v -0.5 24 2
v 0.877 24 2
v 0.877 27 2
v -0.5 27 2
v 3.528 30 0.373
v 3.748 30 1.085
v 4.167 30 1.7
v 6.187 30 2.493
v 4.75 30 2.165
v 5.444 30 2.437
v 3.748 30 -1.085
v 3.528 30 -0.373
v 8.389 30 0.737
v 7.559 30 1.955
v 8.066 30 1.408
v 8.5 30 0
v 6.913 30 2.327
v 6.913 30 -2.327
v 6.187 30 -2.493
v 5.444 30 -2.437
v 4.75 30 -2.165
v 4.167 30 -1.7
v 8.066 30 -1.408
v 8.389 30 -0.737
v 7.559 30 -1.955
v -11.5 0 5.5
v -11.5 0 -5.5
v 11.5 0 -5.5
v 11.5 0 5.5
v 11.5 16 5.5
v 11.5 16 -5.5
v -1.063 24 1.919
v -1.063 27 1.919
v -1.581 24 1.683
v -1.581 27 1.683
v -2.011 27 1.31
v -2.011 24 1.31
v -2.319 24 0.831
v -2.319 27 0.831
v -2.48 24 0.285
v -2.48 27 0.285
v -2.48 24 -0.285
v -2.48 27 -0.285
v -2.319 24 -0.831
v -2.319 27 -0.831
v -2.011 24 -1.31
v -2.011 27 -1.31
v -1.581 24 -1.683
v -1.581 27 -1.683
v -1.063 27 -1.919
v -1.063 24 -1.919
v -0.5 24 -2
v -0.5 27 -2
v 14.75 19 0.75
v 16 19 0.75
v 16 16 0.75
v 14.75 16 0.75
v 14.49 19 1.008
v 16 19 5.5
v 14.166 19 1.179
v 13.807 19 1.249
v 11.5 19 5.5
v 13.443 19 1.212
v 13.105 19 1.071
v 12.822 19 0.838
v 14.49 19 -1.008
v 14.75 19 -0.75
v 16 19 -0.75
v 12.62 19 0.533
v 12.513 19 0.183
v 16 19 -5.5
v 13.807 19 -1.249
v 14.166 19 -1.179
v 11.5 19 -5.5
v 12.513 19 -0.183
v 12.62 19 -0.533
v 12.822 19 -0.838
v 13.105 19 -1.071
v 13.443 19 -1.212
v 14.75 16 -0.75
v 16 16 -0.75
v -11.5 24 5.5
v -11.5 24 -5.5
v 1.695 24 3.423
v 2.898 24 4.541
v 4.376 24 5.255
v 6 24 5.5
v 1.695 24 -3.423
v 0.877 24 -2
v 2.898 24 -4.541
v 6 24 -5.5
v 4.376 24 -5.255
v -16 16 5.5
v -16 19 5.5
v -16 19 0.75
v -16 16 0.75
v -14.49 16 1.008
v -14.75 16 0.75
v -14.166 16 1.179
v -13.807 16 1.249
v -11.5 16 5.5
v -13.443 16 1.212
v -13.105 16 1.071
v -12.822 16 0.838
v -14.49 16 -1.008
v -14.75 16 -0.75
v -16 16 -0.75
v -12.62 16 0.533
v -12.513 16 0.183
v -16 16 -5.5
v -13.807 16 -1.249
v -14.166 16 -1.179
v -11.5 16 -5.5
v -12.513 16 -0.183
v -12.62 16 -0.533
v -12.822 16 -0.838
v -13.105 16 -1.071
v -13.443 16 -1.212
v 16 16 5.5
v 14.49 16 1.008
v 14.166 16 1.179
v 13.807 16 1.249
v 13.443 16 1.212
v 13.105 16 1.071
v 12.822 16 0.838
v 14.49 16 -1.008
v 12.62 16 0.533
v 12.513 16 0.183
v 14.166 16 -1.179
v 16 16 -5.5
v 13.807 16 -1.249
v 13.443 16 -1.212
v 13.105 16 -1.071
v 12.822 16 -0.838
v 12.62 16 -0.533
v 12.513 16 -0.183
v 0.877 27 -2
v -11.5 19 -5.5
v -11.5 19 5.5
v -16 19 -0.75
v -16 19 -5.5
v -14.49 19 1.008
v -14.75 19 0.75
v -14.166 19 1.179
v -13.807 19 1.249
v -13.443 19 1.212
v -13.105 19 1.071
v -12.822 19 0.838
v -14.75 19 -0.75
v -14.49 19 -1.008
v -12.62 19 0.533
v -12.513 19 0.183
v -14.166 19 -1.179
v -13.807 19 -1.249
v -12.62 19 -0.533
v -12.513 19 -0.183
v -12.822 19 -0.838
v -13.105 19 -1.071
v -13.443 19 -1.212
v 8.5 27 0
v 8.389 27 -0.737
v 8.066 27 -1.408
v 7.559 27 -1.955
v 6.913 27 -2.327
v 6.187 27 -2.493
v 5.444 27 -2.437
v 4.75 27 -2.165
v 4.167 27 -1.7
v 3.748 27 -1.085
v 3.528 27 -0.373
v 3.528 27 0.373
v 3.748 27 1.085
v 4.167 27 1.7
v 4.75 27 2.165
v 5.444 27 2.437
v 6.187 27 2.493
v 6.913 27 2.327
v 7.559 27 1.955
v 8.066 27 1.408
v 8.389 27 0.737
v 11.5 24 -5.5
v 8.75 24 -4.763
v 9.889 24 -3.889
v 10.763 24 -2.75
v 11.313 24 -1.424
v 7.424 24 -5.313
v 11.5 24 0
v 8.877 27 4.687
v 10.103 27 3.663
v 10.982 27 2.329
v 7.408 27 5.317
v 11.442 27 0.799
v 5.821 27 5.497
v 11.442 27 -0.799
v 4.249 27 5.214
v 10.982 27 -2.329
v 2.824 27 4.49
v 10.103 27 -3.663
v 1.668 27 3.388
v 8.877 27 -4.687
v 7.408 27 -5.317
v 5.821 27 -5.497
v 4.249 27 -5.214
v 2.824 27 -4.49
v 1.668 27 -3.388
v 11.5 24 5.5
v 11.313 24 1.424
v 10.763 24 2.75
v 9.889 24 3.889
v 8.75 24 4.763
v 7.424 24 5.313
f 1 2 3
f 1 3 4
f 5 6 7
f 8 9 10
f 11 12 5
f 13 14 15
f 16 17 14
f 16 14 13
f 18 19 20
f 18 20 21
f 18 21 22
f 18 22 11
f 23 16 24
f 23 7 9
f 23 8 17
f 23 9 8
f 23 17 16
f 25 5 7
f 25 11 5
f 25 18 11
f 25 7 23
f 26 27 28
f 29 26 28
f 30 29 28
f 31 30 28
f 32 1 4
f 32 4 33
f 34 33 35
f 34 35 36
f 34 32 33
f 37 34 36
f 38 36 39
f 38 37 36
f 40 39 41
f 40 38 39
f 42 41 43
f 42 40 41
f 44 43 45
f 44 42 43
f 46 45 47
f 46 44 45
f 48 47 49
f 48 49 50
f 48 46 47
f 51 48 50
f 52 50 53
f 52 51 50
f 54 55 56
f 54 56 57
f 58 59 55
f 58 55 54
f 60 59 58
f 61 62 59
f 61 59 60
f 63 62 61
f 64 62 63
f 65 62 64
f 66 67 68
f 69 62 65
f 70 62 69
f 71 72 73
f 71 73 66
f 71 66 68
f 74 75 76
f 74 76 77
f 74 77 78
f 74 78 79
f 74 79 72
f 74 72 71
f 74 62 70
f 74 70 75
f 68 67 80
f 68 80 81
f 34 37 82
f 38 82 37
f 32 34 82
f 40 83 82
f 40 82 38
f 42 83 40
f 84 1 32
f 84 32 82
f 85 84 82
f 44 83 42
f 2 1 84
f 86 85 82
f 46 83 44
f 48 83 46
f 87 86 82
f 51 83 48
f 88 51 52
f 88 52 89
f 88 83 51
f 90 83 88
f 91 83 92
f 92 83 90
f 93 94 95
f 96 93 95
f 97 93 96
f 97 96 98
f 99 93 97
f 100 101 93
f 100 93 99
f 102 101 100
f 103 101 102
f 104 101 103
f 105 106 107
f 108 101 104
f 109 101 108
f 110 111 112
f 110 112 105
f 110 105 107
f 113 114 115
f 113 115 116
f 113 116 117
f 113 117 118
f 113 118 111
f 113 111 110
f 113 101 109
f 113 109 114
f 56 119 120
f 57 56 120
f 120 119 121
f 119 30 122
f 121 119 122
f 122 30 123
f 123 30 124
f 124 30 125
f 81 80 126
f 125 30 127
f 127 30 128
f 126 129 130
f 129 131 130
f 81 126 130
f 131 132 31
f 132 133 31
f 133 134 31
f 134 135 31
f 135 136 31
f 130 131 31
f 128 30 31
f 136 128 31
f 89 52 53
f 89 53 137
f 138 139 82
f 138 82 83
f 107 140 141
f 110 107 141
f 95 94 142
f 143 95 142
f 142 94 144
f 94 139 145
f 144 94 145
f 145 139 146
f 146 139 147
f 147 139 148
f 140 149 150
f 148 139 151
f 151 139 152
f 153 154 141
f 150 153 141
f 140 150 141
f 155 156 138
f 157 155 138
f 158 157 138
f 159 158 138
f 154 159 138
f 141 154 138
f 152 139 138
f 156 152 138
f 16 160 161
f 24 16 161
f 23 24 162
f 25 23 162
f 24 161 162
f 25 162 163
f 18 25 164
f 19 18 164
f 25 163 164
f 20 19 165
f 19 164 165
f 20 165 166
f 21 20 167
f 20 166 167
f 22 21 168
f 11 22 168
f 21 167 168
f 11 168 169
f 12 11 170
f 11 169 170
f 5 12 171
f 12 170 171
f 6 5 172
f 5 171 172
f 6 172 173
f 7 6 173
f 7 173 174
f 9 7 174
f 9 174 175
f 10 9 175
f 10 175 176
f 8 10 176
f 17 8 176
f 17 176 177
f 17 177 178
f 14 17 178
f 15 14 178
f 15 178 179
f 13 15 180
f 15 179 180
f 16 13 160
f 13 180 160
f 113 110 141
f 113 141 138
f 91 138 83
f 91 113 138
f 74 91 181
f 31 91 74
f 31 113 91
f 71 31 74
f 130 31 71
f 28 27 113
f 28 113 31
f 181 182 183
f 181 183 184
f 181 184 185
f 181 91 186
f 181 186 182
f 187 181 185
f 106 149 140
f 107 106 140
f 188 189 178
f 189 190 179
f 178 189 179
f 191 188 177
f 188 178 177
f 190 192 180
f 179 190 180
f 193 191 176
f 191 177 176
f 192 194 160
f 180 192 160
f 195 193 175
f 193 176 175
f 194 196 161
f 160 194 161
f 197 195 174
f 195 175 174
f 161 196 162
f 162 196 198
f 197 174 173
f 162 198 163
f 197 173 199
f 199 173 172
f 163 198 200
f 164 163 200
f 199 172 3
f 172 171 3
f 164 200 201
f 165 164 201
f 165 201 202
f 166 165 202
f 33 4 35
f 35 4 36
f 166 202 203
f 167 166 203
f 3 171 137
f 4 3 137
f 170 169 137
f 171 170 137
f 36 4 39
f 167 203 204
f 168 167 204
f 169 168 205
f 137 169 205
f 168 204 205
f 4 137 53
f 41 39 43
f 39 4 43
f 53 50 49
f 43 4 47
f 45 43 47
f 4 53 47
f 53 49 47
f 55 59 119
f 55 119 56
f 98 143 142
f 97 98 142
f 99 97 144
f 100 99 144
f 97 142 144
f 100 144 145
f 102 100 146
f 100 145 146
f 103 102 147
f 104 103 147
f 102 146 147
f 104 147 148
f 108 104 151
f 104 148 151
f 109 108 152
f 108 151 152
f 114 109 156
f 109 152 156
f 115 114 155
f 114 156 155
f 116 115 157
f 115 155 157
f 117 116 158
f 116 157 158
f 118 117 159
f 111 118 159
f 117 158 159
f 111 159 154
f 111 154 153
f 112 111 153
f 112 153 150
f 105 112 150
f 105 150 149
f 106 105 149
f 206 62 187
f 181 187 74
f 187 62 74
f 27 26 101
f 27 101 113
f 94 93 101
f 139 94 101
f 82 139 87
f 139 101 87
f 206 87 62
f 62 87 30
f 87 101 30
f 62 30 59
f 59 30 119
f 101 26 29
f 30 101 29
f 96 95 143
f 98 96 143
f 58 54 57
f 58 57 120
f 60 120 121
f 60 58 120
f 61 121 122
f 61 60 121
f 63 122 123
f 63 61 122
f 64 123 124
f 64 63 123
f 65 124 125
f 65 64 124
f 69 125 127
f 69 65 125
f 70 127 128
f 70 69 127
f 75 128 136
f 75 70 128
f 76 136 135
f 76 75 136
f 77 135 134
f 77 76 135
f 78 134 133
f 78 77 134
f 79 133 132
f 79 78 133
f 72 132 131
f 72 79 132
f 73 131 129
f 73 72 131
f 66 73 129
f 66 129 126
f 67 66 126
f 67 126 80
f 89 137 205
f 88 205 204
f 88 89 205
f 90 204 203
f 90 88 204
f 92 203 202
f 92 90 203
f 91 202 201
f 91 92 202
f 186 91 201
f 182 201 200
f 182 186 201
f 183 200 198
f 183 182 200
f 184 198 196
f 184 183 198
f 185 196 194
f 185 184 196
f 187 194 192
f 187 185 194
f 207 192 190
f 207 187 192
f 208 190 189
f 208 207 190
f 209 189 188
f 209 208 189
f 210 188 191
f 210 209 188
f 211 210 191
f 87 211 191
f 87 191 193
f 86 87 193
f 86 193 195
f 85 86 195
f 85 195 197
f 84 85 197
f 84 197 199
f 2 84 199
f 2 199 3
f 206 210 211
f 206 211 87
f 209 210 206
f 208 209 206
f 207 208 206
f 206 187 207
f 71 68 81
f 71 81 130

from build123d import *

# Parameters (mm, degrees)
SKETCH1_W                = 23
SKETCH1_H                = 11
BOSS_EXTRUDE1_DEPTH      = 24
SKETCH2_W                = 11
SKETCH2_H                = 3
BOSS_EXTRUDE2_DEPTH      = 4.5
BOSS_EXTRUDE2_DEPTH_BACK = 27.5
SKETCH3_R                = 2.5
BOSS_EXTRUDE3_DEPTH      = 3
SKETCH4_R                = 2.5
BOSS_EXTRUDE4_DEPTH      = 3
BOSS_EXTRUDE4_DEPTH_BACK = 27
CUT_EXTRUDE1_DEPTH       = 4


with BuildPart() as part:
    # Sketch1 → Boss-Extrude1 (new body)
    with BuildSketch(Plane(origin=(0, 0, 0), x_dir=(1, 0, 0), z_dir=(0, 1, 0))):
        Rectangle(SKETCH1_W, SKETCH1_H)
    extrude(amount=BOSS_EXTRUDE1_DEPTH)

    # Sketch2 → Boss-Extrude2 (add, two sides)
    with BuildSketch(Plane(origin=(11.5, 0, 0), x_dir=(0, 0, -1), z_dir=(1, 0, 0))) as boss_extrude2_sk:
        with Locations((0, 17.5)):
            Rectangle(SKETCH2_W, SKETCH2_H)
    extrude(amount=BOSS_EXTRUDE2_DEPTH)
    extrude(boss_extrude2_sk.sketch, amount=-BOSS_EXTRUDE2_DEPTH_BACK)

    # Sketch3 → Boss-Extrude3 (add)
    with BuildSketch(Plane(origin=(0, 24, 0), x_dir=(1, 0, 0), z_dir=(0, 1, 0))):
        with BuildLine():
            Line((-0.5, 2), (0.876524617, 2))
            ThreePointArc((0.876524617, 2), (11.5, 0), (0.876524617, -2))
            Line((0.876524617, -2), (-0.5, -2))
            ThreePointArc((-0.5, -2), (-2.5, 0), (-0.5, 2))
        make_face()
        with Locations((6, 0)):
            Circle(SKETCH3_R, mode=Mode.SUBTRACT)
    extrude(amount=BOSS_EXTRUDE3_DEPTH)

    # Sketch4 → Boss-Extrude4 (add, two sides)
    with BuildSketch(Plane(origin=(0, 27, 0), x_dir=(1, 0, 0), z_dir=(0, 1, 0))) as boss_extrude4_sk:
        with Locations((6, 0)):
            Circle(SKETCH4_R)
    extrude(amount=BOSS_EXTRUDE4_DEPTH)
    extrude(boss_extrude4_sk.sketch, amount=-BOSS_EXTRUDE4_DEPTH_BACK)

    # Sketch5 → Cut-Extrude1 (cut)
    with BuildSketch(Plane(origin=(0, 19, 0), x_dir=(1, 0, 0), z_dir=(0, 1, 0))):
        with BuildLine():
            Line((-16, -0.75), (-14.75, -0.75))
            ThreePointArc((-14.75, -0.75), (-12.5, 0), (-14.75, 0.75))
            Line((-14.75, 0.75), (-16, 0.75))
            Line((-16, 0.75), (-16, -0.75))
        make_face()
        with BuildLine():
            Line((14.75, 0.75), (16, 0.75))
            Line((16, 0.75), (16, -0.75))
            Line((16, -0.75), (14.75, -0.75))
            ThreePointArc((14.75, -0.75), (12.5, 0), (14.75, 0.75))
        make_face()
    extrude(amount=-CUT_EXTRUDE1_DEPTH, mode=Mode.SUBTRACT)


solid = part.part
